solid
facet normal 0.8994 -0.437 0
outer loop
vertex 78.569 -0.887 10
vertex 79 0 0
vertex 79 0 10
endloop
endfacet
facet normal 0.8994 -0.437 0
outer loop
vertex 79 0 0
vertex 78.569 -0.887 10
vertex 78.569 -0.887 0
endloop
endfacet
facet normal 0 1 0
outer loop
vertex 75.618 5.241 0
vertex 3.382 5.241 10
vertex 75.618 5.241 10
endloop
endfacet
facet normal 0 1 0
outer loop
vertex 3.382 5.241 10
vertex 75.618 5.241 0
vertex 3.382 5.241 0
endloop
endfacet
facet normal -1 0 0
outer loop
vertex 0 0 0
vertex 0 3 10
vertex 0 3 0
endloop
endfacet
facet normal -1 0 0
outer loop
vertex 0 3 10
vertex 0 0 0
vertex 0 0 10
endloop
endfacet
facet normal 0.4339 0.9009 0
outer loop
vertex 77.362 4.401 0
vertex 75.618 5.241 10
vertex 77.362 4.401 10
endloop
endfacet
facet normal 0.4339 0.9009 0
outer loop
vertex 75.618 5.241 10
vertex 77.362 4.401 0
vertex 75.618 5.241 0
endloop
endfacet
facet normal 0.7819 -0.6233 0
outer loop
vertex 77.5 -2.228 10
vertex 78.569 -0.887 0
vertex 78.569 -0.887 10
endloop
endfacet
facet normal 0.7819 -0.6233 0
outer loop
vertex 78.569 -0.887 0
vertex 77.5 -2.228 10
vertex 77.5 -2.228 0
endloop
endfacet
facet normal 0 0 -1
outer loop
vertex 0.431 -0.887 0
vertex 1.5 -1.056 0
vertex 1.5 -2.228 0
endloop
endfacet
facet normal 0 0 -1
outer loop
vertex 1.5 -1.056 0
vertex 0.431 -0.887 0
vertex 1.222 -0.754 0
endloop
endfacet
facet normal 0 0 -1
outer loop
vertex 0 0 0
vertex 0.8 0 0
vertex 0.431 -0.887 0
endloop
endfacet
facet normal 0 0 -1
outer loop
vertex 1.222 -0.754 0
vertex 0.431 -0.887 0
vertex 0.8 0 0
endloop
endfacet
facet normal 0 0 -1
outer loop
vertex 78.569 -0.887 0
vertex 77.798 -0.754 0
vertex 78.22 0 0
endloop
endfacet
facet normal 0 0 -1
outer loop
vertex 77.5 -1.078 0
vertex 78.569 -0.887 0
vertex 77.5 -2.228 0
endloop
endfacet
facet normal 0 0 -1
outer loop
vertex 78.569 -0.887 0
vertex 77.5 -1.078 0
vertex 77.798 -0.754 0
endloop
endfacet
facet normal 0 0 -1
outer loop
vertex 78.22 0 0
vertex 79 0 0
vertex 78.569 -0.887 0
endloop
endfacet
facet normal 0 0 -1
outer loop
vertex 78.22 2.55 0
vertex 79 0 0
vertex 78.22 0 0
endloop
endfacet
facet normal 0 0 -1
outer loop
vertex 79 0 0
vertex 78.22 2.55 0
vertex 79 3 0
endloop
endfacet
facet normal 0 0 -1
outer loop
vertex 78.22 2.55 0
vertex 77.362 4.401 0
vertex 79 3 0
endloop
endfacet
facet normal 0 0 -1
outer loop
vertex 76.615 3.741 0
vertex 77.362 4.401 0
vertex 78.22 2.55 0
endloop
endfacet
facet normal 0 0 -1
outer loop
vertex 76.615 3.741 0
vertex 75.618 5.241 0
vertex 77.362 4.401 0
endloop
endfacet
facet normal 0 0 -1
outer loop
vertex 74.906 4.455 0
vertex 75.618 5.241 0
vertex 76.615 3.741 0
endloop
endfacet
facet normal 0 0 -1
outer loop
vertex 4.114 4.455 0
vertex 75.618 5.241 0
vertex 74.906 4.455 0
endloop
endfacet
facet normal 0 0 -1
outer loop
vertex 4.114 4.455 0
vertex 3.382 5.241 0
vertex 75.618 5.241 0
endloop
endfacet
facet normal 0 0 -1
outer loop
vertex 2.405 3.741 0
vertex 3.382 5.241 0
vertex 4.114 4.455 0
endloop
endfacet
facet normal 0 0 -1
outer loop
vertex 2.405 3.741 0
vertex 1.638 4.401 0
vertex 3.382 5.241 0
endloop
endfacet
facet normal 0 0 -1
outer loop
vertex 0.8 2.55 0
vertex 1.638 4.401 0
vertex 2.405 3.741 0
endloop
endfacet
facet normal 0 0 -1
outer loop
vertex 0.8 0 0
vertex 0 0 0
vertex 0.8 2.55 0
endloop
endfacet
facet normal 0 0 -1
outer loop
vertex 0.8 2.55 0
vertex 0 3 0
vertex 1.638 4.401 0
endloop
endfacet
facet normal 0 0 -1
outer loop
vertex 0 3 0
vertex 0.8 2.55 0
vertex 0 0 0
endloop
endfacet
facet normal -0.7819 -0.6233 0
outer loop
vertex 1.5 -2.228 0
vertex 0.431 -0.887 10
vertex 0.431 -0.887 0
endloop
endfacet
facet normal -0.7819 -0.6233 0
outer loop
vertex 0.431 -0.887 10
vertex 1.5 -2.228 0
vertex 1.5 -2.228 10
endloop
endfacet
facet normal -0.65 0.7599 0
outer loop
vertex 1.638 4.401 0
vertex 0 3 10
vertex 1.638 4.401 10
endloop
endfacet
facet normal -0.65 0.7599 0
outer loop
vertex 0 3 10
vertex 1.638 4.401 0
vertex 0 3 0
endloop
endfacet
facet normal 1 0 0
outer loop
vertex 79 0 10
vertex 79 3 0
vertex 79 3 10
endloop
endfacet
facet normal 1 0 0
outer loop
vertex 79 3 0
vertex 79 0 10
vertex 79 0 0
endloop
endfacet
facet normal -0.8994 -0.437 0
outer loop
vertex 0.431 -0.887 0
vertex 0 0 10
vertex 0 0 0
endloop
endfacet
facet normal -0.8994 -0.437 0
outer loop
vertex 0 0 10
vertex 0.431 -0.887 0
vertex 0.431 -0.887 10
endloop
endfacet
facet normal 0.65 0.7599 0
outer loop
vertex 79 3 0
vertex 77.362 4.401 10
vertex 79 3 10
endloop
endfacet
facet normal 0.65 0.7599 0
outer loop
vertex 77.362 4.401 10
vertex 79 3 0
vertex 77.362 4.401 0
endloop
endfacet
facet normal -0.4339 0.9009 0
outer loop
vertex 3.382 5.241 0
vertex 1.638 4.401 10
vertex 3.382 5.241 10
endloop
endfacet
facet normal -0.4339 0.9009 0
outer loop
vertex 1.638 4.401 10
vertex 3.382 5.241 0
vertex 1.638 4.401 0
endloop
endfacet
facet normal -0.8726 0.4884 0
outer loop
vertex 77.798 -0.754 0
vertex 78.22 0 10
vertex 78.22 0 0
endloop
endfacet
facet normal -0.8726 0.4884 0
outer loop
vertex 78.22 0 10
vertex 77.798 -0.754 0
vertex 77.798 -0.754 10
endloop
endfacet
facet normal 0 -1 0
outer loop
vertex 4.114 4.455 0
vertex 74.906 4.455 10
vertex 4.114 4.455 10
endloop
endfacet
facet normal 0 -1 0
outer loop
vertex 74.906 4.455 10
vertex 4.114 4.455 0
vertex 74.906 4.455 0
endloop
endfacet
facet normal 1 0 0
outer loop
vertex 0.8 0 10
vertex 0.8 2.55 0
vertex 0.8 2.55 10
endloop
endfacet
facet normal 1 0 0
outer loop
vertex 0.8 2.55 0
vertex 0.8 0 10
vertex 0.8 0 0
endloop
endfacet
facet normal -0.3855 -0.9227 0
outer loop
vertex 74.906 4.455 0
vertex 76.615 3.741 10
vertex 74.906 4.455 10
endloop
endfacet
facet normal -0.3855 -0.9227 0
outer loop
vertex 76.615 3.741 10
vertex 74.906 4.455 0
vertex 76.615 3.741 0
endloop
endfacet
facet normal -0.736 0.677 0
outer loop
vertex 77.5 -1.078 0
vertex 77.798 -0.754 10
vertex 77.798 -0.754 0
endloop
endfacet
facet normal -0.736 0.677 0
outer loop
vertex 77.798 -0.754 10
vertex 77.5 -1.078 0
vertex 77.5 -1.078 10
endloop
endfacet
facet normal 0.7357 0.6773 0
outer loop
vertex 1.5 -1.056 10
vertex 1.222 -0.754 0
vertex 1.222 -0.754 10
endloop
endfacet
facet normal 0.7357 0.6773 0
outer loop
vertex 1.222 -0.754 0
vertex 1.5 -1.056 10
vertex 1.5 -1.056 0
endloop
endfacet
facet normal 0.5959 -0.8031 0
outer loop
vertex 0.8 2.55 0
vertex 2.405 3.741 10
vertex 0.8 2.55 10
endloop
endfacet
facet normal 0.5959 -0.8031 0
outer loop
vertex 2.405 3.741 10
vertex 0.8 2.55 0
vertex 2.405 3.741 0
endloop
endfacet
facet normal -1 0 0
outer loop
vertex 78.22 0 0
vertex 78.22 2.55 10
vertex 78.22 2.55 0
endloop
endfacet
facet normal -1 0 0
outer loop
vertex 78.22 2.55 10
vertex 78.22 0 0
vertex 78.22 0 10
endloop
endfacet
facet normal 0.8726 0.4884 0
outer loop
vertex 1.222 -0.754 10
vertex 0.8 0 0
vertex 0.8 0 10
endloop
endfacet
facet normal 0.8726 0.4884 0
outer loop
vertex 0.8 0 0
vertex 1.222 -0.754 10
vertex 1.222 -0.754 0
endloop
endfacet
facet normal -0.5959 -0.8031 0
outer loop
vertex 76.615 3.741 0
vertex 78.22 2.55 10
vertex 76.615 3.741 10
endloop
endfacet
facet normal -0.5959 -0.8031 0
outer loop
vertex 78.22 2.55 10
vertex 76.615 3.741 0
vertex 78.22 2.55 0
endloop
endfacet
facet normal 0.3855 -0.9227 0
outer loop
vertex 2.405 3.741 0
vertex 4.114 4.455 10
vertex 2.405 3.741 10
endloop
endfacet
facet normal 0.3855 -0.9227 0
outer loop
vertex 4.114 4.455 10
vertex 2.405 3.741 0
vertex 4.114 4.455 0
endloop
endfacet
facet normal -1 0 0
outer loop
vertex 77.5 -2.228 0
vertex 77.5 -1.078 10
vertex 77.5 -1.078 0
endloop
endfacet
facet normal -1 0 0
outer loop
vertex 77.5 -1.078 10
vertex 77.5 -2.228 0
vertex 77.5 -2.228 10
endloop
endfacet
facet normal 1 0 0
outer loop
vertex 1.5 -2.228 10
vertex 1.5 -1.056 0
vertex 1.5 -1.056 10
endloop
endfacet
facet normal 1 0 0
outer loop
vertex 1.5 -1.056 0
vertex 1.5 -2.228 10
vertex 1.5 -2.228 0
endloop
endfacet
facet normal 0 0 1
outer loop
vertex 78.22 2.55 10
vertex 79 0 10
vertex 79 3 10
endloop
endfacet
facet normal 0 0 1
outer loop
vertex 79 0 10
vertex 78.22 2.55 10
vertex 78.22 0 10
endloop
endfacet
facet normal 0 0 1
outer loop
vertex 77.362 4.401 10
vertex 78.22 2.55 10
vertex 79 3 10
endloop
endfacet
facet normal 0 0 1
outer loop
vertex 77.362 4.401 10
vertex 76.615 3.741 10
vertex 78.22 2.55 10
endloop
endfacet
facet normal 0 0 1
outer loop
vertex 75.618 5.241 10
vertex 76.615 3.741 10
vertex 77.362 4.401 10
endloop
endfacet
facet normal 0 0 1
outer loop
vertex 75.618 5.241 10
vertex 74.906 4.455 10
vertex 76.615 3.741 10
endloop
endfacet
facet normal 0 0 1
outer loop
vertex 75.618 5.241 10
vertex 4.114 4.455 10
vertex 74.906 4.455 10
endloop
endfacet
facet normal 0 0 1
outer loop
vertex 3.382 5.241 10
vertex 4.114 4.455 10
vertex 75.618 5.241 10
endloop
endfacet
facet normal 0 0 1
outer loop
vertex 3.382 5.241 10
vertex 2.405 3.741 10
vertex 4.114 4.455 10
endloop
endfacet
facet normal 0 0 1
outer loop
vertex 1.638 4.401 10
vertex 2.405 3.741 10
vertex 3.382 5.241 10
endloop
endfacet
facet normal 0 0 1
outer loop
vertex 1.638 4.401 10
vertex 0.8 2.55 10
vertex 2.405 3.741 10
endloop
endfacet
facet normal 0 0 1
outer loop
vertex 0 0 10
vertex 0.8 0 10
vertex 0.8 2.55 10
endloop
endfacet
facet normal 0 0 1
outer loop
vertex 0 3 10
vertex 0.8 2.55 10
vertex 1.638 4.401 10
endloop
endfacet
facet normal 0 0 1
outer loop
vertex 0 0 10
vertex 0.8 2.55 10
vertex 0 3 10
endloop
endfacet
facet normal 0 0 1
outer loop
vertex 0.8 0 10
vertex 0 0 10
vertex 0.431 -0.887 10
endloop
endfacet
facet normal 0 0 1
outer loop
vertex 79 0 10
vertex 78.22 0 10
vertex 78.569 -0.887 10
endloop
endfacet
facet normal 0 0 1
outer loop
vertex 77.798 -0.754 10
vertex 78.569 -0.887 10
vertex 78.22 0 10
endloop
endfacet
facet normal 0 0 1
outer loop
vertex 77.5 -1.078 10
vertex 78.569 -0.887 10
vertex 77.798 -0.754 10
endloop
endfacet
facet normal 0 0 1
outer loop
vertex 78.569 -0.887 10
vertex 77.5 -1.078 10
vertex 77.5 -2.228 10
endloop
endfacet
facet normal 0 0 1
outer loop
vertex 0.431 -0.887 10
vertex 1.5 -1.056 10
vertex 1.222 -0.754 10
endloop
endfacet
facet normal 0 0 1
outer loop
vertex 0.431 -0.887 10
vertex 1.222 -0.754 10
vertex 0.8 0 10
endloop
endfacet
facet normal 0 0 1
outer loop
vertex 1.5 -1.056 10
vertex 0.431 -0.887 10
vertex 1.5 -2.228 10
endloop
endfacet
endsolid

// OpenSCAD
module outer() {
    hull() {
        cube([79, 3, 84], false);
        translate([4.35, 1, 0])
        cylinder(h = 84, d = 8.7, center = false);
        translate([74.65, 1, 0]) {
            cylinder(h = 84, d = 8.7, center = false);
        }
    }
}

module holderShell() {
    difference() {
        outer();
        translate([.8, 0, 0])
            scale([0.98, 0.85, 1])
                outer();
    }
}

difference() {
difference() {
    holderShell();
    translate([1.5, -10, 0])
    cube([76, 10, 84]);
}
translate([-10, -10, 10])
cube([100, 30, 74]);
}
